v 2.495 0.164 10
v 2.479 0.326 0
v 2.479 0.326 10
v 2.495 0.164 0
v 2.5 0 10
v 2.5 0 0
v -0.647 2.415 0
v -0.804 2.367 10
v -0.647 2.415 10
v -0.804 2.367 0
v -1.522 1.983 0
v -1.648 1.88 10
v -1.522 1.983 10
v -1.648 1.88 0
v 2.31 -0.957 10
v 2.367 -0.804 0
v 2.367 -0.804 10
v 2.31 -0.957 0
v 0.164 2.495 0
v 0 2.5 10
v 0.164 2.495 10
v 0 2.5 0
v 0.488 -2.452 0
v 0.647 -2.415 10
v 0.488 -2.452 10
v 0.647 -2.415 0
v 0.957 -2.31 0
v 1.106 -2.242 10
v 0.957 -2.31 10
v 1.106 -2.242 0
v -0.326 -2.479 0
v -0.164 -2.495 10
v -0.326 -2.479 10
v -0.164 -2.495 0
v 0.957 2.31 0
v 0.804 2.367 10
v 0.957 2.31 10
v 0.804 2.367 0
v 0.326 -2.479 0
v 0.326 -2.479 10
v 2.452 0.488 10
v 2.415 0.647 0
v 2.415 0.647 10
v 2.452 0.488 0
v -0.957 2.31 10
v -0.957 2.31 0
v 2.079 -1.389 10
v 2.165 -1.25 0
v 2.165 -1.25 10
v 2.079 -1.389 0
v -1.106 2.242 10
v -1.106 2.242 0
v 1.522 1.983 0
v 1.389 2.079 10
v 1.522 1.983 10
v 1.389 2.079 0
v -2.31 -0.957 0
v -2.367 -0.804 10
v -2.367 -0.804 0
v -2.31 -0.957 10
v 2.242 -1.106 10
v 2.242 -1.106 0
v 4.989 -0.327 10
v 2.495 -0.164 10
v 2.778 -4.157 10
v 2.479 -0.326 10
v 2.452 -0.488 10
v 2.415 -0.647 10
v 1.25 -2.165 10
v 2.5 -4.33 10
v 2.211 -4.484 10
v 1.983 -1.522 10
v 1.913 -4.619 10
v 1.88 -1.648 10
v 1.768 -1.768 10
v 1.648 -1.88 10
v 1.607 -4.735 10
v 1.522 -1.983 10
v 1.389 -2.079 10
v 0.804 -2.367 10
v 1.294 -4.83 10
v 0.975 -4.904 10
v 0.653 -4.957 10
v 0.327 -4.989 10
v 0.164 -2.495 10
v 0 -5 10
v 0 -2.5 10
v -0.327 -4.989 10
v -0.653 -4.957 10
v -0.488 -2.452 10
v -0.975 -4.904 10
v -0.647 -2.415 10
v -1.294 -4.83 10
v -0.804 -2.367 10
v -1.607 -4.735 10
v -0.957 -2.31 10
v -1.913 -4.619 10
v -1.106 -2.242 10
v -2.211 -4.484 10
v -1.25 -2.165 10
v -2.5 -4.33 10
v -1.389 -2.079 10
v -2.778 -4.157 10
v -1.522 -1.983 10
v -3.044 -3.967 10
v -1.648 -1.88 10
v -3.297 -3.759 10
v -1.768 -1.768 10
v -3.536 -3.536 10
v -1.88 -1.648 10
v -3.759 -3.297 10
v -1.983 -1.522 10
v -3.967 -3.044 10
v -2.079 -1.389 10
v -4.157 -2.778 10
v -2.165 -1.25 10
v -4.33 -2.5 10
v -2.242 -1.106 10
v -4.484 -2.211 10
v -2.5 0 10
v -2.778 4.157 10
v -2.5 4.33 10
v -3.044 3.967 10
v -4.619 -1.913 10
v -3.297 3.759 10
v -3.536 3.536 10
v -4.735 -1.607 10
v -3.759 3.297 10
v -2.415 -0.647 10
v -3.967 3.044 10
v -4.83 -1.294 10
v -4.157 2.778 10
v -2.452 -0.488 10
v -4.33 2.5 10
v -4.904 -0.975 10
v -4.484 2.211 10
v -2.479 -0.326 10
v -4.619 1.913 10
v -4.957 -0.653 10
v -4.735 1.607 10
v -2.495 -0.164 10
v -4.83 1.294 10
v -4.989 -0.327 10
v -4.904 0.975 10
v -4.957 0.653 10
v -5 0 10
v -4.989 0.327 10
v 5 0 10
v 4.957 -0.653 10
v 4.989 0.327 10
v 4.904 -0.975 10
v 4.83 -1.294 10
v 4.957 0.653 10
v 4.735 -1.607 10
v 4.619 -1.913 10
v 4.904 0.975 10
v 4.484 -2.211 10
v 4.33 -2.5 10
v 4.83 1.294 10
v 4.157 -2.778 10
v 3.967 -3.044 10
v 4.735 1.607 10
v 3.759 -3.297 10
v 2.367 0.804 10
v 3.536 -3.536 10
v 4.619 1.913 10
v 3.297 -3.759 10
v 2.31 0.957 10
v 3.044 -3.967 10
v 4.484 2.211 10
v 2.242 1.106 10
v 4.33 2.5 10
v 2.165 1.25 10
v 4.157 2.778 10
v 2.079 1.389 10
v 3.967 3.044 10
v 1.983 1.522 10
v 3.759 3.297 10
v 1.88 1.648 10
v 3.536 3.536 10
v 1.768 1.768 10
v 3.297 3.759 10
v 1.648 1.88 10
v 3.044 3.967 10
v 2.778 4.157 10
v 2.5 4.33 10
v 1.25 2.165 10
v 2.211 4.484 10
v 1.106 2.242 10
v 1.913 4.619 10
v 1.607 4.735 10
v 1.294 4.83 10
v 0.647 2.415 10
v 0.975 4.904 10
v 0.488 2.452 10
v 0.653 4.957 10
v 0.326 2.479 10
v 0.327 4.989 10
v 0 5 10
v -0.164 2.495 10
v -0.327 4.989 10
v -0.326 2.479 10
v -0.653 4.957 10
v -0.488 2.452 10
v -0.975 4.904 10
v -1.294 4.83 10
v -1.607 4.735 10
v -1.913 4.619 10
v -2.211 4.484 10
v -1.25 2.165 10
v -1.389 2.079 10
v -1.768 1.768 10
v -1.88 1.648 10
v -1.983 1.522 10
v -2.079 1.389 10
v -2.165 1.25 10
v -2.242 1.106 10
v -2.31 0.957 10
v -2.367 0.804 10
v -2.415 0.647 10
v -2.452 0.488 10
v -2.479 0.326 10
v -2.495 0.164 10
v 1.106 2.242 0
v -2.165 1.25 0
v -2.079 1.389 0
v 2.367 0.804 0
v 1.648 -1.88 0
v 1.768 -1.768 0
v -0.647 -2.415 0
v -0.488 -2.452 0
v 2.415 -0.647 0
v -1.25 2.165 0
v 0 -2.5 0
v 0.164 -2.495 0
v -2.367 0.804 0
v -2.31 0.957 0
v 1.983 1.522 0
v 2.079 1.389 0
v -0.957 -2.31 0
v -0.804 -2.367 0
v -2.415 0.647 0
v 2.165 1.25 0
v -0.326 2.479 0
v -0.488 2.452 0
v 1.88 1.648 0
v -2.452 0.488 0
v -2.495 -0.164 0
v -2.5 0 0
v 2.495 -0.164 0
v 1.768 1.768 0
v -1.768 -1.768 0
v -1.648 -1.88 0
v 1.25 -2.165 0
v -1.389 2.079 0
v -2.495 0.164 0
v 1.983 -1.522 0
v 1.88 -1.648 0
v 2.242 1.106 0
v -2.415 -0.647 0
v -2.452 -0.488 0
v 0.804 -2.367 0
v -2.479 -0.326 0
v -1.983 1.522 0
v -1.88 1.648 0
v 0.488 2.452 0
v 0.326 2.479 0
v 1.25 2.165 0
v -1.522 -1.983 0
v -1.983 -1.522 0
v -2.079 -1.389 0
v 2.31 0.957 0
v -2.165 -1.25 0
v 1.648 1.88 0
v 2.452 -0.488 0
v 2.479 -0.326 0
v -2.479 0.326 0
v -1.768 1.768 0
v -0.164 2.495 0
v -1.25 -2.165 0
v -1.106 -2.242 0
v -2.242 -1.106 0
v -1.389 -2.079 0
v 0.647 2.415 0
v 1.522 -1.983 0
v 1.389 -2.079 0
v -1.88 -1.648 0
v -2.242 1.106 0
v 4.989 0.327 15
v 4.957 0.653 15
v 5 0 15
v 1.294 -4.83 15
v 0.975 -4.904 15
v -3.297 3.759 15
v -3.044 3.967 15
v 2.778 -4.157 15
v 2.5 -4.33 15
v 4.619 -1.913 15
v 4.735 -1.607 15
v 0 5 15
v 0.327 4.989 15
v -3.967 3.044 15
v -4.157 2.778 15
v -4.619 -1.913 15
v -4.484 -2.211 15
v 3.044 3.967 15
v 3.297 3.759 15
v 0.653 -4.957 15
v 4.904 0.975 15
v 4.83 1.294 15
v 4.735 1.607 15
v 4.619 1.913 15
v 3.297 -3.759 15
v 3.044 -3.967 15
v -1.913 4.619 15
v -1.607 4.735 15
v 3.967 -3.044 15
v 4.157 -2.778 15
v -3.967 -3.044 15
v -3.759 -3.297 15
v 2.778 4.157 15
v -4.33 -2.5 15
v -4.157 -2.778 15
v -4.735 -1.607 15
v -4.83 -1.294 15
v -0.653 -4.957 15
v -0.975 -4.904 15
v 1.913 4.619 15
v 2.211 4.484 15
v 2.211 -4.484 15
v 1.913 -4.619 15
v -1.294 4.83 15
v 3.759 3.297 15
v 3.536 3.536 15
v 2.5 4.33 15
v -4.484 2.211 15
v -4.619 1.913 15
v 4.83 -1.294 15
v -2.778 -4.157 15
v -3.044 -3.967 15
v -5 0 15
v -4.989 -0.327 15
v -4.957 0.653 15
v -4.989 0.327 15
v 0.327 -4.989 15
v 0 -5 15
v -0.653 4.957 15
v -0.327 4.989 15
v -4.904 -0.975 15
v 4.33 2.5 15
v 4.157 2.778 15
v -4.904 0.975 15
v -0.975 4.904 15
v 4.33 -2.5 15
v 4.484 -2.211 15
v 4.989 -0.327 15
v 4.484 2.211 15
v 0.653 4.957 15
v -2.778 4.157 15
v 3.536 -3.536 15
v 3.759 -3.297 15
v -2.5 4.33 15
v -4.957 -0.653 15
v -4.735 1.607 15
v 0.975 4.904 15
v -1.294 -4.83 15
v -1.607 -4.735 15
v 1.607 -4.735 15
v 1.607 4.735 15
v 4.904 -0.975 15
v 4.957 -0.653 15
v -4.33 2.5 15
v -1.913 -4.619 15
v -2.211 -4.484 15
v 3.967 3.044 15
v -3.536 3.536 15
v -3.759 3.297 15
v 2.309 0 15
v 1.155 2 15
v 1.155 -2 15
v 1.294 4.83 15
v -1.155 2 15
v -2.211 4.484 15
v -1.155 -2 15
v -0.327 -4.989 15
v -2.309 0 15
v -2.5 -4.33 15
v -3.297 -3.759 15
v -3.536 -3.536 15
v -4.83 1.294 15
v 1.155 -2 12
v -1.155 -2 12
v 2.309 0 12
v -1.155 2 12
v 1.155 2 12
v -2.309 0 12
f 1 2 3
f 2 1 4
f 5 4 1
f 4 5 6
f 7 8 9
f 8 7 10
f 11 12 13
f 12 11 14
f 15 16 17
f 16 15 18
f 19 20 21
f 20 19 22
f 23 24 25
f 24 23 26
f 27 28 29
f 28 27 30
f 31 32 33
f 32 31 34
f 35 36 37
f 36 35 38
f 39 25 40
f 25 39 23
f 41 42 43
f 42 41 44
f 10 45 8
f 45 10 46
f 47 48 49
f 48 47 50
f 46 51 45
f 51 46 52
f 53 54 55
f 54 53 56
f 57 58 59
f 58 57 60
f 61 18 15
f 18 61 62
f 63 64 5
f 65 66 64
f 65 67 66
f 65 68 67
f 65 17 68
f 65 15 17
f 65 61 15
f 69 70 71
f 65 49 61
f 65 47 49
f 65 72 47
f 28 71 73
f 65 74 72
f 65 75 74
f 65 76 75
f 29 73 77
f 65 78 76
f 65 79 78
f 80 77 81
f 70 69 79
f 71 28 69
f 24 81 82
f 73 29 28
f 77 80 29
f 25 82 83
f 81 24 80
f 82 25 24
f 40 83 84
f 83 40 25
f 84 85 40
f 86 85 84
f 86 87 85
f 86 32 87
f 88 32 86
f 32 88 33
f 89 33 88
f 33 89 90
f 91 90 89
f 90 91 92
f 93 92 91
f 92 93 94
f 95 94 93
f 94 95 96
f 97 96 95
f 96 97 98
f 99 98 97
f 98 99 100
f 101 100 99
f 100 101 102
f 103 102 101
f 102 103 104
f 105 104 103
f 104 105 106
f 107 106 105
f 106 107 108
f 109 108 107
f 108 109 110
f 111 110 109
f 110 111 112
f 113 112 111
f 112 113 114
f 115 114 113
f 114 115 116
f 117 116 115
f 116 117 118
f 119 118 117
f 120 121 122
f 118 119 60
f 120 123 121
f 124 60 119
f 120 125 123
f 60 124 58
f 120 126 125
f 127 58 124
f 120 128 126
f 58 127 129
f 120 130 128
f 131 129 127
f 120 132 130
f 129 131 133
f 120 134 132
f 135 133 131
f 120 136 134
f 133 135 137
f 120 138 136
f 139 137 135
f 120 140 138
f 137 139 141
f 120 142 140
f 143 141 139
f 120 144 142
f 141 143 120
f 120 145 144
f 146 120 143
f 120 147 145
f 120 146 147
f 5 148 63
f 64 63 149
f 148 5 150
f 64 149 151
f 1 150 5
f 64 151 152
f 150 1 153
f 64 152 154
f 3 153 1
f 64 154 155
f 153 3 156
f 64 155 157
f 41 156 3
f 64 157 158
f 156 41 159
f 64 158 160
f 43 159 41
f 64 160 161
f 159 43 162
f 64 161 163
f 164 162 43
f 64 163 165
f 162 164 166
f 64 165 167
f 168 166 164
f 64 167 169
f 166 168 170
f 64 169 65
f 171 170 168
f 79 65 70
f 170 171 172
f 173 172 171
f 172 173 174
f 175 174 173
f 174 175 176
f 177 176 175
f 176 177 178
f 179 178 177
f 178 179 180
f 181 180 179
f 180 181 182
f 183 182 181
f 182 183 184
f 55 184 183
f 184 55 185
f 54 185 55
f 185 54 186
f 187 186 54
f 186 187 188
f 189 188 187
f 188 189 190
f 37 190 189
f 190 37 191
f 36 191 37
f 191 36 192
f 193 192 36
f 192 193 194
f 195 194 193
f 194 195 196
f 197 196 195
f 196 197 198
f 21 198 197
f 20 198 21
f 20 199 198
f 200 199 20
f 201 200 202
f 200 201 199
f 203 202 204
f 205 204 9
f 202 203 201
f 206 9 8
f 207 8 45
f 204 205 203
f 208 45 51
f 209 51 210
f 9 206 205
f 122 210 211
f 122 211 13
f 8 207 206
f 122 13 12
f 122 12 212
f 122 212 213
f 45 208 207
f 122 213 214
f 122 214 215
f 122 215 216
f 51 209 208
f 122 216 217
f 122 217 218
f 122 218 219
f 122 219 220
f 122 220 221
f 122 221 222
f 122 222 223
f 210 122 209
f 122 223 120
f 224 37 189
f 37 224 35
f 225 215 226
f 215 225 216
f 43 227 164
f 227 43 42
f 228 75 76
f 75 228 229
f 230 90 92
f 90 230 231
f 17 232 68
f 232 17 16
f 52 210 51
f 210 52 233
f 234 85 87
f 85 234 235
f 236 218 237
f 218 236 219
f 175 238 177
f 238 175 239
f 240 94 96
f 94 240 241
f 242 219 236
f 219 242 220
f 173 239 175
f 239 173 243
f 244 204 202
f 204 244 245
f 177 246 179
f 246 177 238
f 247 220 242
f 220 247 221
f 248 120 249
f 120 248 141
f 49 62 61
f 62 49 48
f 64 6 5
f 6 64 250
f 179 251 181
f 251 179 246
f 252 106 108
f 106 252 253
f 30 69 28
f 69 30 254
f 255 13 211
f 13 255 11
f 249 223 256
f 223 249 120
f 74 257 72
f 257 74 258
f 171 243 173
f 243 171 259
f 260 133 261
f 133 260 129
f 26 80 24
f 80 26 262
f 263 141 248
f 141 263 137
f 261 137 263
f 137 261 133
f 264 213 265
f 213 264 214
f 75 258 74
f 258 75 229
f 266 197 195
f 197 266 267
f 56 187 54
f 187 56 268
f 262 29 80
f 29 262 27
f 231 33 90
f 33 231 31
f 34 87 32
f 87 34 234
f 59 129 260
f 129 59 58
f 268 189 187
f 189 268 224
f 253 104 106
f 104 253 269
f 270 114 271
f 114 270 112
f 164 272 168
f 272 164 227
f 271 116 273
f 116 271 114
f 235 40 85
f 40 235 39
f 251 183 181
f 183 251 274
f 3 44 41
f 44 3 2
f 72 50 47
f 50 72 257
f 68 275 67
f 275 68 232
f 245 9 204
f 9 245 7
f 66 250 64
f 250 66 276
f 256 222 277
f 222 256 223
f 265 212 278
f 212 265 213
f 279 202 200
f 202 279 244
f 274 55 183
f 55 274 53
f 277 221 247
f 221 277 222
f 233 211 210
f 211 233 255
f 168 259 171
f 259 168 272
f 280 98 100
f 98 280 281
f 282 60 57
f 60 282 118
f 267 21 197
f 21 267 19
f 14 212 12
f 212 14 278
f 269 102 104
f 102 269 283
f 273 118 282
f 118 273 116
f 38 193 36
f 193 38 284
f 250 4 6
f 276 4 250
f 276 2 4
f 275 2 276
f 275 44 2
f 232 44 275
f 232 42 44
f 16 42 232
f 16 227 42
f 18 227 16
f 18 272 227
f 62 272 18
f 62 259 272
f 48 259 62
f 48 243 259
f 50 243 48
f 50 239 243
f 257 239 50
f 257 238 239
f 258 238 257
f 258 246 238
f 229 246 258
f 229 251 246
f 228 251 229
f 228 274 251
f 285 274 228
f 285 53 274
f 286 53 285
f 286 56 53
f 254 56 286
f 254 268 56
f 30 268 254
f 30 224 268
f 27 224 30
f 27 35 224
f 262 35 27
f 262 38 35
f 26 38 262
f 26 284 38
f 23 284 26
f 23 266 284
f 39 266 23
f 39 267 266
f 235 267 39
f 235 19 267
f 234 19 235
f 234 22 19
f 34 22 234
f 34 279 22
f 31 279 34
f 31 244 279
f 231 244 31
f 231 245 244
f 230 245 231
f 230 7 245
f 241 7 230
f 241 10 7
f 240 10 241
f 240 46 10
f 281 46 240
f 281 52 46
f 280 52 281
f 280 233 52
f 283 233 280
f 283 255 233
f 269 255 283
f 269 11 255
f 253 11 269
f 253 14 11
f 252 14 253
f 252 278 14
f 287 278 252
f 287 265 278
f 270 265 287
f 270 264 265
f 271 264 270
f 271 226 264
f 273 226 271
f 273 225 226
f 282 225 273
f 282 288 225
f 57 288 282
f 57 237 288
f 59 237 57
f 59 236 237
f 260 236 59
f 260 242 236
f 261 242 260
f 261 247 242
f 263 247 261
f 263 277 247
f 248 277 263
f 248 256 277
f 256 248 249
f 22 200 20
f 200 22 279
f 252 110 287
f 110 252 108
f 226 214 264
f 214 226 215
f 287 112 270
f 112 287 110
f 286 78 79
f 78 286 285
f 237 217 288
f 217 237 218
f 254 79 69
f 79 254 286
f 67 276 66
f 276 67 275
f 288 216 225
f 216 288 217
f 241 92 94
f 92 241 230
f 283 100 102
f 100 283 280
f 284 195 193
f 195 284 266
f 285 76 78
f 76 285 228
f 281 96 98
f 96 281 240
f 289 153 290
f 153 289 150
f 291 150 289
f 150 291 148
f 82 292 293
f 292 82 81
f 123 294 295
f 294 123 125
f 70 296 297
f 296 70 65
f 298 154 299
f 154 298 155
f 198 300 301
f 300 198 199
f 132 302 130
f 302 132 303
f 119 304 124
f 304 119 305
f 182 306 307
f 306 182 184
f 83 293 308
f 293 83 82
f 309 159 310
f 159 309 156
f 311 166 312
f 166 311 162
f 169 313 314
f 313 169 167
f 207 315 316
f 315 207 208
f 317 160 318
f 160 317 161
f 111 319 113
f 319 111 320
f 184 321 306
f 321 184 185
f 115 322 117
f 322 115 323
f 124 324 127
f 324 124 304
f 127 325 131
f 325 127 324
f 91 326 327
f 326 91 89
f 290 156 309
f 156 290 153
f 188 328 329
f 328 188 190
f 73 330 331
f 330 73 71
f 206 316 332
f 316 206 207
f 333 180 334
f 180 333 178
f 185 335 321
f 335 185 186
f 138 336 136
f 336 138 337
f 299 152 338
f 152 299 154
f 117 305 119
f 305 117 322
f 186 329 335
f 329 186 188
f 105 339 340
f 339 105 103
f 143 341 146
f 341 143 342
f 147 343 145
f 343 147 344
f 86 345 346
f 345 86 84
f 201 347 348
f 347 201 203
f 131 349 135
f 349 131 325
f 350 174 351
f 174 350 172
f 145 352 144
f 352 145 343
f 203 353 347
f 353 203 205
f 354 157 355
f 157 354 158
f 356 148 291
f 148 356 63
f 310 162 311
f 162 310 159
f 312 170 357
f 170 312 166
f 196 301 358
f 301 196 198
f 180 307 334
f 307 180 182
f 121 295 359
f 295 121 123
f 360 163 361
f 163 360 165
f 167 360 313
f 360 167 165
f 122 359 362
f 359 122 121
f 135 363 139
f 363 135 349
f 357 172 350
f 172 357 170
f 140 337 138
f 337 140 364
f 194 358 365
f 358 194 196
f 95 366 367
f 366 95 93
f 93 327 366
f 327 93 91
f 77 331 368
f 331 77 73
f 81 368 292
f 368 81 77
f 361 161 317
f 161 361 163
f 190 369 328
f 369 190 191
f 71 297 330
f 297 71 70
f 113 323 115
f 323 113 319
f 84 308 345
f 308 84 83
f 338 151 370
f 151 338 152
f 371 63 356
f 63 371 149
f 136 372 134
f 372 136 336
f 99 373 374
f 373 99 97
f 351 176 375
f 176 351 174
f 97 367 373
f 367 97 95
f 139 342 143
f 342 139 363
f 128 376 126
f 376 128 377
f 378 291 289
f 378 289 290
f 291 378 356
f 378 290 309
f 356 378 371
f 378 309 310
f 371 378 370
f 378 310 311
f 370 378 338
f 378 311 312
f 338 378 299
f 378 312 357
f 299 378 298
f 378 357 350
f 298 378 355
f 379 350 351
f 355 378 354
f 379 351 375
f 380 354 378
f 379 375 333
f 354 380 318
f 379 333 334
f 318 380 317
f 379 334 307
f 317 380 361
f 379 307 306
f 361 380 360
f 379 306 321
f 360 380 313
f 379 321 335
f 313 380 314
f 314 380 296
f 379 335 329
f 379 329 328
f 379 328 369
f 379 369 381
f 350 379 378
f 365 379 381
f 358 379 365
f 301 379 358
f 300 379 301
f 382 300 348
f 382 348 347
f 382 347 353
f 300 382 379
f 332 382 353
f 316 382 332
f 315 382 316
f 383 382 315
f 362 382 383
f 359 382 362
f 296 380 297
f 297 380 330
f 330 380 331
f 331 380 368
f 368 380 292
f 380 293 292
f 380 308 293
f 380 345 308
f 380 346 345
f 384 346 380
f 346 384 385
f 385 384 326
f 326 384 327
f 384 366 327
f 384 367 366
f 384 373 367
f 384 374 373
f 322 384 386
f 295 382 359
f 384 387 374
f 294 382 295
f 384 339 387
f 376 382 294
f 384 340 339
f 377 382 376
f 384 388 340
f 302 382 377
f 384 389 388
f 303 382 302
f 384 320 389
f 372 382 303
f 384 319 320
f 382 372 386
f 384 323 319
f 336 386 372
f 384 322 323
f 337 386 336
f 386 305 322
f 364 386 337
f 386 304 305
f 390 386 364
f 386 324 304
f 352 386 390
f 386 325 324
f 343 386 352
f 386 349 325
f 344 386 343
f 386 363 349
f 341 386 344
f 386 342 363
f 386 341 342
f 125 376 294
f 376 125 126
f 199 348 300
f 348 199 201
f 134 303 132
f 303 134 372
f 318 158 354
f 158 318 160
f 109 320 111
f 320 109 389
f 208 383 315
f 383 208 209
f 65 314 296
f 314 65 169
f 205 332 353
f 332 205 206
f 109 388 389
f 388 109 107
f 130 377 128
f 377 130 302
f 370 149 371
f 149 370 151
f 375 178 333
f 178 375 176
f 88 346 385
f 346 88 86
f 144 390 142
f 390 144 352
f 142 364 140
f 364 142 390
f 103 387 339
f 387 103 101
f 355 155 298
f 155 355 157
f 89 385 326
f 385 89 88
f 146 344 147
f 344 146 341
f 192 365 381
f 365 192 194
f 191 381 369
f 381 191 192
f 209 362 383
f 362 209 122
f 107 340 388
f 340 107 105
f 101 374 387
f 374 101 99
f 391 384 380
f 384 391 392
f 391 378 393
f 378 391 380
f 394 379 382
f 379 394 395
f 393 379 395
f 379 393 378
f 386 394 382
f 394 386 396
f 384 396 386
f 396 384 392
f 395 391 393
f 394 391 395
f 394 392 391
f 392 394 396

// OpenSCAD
$fn = 96;

// Socket Head Cap Screw (approx. ISO 4762)
// Given: shank diameter = 5.0mm, head diameter = 10.0mm, length under head = 10mm

d_shank = 5.0;
d_head  = 10.0;
L       = 10.0;

// Typical proportions for M5 socket head cap screw
k_head  = 5.0;   // head height (approx)
s_hex   = 4.0;   // hex socket across flats (approx)
t_hex   = 3.0;   // socket depth (approx)

module hex_prism(af, h){
    // Regular hex with across-flats = af
    r = af / sqrt(3); // circumradius
    cylinder(h=h, r=r, $fn=6);
}

module socket_head_cap_screw(d_shank, d_head, L, k_head, s_hex, t_hex){
    difference(){
        union(){
            // Shank (unthreaded representation)
            cylinder(h=L, d=d_shank);

            // Head
            translate([0,0,L])
                cylinder(h=k_head, d=d_head);
        }

        // Hex socket cut
        translate([0,0,L + k_head - t_hex])
            hex_prism(s_hex, t_hex + 0.2);
    }
}

socket_head_cap_screw(d_shank, d_head, L, k_head, s_hex, t_hex);
